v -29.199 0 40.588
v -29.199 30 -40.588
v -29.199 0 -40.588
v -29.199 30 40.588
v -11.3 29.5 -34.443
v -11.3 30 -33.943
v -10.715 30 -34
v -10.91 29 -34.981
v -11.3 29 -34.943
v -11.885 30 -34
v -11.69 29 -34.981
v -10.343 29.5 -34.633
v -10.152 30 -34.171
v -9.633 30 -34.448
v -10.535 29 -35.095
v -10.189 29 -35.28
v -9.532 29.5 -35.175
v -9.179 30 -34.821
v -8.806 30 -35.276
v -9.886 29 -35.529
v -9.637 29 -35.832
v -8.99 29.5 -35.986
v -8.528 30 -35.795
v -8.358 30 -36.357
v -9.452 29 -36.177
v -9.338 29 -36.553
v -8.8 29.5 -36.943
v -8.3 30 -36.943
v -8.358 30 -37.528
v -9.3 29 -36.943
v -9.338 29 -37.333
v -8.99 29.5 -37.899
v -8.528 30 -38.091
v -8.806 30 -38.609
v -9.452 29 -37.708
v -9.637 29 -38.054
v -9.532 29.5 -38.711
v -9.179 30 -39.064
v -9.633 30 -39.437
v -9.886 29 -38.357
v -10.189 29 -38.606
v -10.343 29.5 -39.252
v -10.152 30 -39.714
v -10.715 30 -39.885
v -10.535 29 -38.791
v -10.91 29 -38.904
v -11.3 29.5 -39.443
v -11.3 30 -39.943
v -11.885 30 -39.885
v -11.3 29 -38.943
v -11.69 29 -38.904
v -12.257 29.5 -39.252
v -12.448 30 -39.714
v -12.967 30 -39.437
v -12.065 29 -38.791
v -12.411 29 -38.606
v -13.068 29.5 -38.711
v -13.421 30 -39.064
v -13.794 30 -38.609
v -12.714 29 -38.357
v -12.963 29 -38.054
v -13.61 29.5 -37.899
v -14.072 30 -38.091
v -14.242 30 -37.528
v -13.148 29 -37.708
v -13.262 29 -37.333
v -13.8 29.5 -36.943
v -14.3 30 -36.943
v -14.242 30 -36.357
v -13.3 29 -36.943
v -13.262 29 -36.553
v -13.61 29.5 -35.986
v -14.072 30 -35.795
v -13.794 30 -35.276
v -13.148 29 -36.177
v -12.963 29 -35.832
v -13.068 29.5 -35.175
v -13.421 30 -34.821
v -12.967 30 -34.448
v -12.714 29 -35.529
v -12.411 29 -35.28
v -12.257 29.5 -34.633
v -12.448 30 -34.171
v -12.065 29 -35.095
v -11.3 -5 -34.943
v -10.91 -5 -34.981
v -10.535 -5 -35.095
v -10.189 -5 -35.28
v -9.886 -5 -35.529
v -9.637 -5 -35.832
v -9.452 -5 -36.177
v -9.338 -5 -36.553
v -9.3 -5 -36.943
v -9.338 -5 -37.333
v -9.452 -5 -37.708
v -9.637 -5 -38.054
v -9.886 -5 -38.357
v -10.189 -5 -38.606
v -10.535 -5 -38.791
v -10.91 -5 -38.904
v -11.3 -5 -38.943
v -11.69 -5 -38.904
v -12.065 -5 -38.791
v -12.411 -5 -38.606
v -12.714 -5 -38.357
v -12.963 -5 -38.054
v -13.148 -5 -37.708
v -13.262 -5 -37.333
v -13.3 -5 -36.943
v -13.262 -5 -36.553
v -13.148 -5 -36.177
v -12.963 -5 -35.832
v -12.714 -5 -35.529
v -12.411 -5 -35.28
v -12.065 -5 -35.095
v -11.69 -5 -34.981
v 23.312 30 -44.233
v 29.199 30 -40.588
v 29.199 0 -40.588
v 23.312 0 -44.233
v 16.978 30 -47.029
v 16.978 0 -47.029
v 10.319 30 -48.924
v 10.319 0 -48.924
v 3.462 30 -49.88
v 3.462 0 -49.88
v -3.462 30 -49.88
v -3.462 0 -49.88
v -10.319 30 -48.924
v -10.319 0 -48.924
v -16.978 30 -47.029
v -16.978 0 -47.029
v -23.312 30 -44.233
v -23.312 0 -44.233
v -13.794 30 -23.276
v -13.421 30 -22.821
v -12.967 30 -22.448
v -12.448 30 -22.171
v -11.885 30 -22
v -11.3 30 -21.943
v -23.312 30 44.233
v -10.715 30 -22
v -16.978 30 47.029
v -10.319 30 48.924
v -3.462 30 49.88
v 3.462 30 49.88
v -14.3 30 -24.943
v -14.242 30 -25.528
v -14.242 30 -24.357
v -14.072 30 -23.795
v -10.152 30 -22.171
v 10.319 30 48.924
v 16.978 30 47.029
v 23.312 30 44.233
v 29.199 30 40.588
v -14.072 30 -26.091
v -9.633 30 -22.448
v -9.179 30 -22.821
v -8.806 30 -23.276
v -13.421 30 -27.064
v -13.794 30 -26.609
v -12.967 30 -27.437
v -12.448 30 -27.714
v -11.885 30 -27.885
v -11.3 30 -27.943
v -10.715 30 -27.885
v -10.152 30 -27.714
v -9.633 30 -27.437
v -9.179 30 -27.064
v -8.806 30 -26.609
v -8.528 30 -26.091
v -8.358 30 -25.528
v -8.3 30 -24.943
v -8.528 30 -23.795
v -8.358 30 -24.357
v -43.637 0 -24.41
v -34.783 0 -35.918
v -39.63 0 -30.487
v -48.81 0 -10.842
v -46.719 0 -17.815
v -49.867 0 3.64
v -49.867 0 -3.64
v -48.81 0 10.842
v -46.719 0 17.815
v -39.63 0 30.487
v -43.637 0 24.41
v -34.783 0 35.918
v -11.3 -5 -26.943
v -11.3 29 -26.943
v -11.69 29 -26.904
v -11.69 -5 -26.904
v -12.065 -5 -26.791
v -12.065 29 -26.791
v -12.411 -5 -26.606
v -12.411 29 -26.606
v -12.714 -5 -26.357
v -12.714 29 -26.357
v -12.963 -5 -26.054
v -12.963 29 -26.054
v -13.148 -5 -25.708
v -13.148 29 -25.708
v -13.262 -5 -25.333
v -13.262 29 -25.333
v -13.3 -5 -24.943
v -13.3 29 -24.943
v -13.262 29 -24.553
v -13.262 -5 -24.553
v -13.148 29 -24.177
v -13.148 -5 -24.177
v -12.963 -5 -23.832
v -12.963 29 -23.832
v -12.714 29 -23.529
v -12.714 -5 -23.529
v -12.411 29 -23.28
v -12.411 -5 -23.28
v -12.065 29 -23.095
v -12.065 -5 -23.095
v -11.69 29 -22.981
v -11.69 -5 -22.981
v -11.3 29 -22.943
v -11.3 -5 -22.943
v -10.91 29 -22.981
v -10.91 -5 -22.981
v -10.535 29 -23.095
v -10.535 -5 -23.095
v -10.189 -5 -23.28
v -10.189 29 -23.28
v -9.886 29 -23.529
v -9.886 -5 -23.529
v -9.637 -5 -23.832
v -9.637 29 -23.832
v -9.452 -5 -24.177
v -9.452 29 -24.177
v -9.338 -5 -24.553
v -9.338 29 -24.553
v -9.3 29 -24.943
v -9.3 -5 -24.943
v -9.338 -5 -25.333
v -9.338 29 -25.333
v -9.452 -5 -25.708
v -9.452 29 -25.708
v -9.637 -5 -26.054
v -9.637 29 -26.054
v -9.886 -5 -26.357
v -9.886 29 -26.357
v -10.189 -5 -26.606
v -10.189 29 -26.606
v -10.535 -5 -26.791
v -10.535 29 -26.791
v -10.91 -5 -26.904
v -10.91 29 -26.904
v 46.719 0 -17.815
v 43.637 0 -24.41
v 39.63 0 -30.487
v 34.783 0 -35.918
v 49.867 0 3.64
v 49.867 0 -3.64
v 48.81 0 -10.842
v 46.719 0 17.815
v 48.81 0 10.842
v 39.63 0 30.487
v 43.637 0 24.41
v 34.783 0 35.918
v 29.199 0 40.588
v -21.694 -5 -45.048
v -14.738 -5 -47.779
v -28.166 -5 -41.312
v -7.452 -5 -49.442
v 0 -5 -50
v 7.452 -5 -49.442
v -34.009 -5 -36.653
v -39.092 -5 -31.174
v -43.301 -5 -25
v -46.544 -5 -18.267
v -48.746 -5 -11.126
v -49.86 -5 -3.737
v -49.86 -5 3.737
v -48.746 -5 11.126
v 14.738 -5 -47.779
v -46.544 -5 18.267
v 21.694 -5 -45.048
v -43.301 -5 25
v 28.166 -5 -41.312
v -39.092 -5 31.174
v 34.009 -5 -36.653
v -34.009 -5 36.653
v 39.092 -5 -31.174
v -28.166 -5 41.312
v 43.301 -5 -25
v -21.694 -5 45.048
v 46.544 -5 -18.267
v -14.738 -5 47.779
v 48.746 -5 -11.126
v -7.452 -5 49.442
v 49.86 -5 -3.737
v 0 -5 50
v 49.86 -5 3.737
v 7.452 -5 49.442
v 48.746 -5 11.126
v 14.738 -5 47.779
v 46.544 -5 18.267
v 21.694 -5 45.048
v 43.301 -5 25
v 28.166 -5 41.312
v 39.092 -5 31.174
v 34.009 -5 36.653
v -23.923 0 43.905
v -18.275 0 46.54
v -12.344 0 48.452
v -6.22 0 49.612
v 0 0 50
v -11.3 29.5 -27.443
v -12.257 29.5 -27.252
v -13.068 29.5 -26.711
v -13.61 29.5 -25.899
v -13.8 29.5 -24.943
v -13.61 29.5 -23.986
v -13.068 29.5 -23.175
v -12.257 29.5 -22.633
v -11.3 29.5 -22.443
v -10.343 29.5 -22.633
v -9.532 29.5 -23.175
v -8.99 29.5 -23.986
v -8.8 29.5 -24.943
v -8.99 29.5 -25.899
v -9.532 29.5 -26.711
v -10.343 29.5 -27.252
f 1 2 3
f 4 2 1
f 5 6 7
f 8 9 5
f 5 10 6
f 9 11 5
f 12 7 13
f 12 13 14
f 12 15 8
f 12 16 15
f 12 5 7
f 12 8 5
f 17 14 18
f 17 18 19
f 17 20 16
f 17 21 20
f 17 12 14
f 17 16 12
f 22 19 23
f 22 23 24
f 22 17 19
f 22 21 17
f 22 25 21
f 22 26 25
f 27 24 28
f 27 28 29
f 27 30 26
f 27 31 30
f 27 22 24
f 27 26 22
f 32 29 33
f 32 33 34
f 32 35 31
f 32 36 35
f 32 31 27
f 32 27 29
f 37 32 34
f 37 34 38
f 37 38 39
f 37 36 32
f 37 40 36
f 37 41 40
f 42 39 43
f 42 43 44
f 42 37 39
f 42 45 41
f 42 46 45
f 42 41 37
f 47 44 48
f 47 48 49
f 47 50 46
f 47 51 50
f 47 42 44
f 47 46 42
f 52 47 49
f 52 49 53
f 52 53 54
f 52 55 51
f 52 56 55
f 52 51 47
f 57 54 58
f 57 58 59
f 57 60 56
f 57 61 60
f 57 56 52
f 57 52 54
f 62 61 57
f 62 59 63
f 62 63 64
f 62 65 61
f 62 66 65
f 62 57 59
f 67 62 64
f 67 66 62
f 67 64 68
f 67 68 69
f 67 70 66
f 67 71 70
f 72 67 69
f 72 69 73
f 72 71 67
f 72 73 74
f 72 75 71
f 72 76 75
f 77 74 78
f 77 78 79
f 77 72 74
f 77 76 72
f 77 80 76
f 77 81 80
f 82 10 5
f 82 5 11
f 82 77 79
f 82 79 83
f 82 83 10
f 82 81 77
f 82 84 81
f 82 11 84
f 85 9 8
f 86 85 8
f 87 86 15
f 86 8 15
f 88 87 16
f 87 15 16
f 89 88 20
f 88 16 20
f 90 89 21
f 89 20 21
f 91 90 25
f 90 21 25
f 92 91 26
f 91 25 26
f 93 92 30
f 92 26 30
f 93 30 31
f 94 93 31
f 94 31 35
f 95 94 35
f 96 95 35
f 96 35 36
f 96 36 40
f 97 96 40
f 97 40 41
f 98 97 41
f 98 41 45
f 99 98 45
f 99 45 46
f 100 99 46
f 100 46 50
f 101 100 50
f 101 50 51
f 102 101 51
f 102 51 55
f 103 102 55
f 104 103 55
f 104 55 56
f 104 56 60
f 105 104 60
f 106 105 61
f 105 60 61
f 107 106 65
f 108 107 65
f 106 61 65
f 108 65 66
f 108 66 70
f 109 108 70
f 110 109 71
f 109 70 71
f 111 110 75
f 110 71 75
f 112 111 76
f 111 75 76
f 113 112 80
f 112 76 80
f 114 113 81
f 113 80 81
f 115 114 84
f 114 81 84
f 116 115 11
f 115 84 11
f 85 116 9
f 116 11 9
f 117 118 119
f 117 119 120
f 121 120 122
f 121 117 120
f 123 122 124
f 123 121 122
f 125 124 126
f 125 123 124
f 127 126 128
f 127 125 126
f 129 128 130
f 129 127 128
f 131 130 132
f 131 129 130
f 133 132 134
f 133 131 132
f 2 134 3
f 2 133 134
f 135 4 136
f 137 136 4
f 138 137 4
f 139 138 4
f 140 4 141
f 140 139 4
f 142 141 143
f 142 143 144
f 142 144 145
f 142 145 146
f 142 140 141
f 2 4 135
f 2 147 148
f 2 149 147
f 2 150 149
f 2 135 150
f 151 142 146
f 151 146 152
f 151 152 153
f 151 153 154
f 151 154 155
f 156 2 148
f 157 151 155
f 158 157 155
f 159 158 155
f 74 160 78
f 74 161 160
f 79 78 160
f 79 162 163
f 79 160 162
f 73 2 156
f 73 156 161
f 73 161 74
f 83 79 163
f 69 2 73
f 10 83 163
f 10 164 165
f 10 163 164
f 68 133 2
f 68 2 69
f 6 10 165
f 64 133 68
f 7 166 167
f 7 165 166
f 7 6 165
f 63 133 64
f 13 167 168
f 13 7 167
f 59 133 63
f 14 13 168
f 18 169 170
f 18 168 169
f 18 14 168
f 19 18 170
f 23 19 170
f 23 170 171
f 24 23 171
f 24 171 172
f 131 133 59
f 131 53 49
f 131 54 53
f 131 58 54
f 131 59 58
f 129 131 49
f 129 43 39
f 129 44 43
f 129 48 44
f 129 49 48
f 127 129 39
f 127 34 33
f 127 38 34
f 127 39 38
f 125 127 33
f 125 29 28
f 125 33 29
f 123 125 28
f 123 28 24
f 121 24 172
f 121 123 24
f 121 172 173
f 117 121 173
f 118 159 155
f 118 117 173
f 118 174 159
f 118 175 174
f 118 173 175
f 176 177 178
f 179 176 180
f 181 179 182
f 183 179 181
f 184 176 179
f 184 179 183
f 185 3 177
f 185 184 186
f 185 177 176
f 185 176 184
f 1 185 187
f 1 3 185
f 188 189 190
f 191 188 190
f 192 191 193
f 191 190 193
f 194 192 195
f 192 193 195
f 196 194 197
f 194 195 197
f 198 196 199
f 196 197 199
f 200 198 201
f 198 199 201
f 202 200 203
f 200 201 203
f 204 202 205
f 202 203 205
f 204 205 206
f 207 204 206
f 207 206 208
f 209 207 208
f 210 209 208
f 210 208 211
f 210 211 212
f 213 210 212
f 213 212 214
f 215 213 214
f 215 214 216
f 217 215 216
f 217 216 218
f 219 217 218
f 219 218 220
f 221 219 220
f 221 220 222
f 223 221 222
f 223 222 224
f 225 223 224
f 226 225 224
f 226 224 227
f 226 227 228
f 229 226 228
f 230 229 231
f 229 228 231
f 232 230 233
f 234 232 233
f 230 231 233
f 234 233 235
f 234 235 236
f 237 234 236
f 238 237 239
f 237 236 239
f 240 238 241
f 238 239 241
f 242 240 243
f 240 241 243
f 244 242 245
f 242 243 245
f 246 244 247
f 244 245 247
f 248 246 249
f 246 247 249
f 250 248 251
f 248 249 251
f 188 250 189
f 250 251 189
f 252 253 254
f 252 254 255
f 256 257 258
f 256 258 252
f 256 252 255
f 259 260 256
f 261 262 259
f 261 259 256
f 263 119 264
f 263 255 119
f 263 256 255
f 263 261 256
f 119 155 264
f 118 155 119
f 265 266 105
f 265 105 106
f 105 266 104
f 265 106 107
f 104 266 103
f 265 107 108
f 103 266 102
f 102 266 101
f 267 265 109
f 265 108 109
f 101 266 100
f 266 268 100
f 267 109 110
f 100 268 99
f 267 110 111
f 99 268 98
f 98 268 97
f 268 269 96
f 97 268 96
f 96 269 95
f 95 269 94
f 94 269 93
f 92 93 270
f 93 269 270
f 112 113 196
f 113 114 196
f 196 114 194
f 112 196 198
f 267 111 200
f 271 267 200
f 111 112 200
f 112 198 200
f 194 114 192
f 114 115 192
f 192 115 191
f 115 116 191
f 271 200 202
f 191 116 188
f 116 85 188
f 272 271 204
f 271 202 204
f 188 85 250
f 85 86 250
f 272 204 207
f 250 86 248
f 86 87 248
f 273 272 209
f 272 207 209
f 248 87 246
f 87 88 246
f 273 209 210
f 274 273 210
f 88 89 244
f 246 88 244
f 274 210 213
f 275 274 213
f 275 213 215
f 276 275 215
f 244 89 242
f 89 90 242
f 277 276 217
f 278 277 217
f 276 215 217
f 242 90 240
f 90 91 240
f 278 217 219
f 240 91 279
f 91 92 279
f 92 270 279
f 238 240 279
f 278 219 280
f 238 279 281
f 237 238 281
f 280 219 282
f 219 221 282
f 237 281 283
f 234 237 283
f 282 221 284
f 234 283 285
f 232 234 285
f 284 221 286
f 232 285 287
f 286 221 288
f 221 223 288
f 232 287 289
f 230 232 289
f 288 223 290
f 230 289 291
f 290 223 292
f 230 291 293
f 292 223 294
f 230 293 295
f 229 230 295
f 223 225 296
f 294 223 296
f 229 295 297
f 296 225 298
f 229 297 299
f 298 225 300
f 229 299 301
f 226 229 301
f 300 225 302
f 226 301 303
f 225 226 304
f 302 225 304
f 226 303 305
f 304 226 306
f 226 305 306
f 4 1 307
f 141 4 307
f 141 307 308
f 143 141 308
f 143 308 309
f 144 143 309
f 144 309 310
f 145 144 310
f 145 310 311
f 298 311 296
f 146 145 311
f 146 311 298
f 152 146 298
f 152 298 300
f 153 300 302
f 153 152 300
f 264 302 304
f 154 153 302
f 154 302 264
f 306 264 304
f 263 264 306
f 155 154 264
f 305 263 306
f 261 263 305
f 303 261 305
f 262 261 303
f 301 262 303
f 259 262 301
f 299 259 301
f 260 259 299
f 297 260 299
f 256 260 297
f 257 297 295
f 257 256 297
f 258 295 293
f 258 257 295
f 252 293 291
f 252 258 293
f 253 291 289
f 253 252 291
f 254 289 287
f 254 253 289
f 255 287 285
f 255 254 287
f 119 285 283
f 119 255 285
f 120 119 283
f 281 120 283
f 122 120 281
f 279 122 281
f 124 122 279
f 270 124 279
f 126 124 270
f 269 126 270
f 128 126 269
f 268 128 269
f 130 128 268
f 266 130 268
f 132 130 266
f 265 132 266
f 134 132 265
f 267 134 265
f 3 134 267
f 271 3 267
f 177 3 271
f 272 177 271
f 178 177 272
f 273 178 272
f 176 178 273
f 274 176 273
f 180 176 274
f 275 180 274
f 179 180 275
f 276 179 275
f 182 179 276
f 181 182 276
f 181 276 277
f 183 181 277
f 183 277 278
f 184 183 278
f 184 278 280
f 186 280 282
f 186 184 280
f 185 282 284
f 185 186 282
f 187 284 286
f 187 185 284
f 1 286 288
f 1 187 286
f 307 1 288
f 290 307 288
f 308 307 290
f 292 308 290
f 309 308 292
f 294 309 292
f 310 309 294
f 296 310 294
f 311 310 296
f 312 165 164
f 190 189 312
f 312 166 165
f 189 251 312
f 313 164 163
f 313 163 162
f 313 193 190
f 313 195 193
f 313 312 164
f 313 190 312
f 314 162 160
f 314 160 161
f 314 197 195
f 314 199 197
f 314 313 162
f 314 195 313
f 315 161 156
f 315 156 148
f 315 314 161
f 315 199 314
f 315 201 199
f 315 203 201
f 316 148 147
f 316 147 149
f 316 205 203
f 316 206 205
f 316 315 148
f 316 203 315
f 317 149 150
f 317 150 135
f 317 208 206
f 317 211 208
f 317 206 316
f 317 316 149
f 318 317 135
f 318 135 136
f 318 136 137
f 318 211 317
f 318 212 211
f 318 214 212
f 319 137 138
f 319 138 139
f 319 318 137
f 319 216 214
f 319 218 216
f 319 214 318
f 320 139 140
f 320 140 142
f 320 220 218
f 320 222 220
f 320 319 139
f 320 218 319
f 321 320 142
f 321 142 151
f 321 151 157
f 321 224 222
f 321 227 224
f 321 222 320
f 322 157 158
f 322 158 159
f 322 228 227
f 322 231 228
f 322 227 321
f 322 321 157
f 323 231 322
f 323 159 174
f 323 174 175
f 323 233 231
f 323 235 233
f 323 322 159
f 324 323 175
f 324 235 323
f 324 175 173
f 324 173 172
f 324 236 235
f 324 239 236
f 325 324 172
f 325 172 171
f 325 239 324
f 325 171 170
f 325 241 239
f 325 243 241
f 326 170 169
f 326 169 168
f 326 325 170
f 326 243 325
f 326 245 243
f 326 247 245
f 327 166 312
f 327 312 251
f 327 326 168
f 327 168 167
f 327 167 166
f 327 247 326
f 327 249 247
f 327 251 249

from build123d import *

# Parameters (mm, degrees)
IZIM1_R                     = 50
BASE_DEPTH                  = 5
Y_KSEKLIK_EKSTR_ZYON2_START = 30
Y_KSEKLIK_EKSTR_ZYON2_DEPTH = 30
IZIM2_R                     = 2
BANANA_SLOTU_DEPTH          = 79.89866919
PAH1_SIZE                   = 1


with BuildPart() as part:
    # Çizim1 → base (new body)
    with BuildSketch(Plane(origin=(0, 0, 0), x_dir=(1, 0, 0), z_dir=(0, 1, 0))):
        Circle(IZIM1_R)
    extrude(amount=-BASE_DEPTH)

    # Çizim1<3> → Yükseklik-Ekstrüzyon2 (add)
    with BuildSketch(Plane(origin=(0, 0, 0), x_dir=(1, 0, 0), z_dir=(0, 1, 0)).offset(Y_KSEKLIK_EKSTR_ZYON2_START)):
        with BuildLine():
            ThreePointArc((29.199046601, 40.588368748), (0, 50), (-29.199046601, 40.588368748))
            Line((-29.199046601, 40.588368748), (-29.199046601, 16.5))
            Line((-29.199046601, 16.5), (-29.199046601, -16.5))
            Line((-29.199046601, -16.5), (-29.199046601, -40.588368748))
            ThreePointArc((-29.199046601, -40.588368748), (0, -50), (29.199046601, -40.588368748))
            Line((29.199046601, -40.588368748), (29.199046601, -16.5))
            Line((29.199046601, -16.5), (29.199046601, 16.5))
            Line((29.199046601, 16.5), (29.199046601, 40.588368748))
        make_face()
    extrude(amount=-Y_KSEKLIK_EKSTR_ZYON2_DEPTH)

    # Çizim2 → banana slotu (cut, through all)
    with BuildSketch(Plane(origin=(0, 30, 0), x_dir=(1, 0, 0), z_dir=(0, 1, 0))):
        with Locations((-11.3, 36.942764929)):
            Circle(IZIM2_R)
        with Locations((-11.3, 24.942764929)):
            Circle(IZIM2_R)
    extrude(amount=-BANANA_SLOTU_DEPTH, mode=Mode.SUBTRACT)

    # Pah1
    pah1_edges = [part.edges().sort_by_distance(p)[0] for p in [
        (-13.3, 30, -36.942764929),
        (-13.3, 30, -24.942764929),
    ]]
    chamfer(pah1_edges, length=PAH1_SIZE)


solid = part.part
